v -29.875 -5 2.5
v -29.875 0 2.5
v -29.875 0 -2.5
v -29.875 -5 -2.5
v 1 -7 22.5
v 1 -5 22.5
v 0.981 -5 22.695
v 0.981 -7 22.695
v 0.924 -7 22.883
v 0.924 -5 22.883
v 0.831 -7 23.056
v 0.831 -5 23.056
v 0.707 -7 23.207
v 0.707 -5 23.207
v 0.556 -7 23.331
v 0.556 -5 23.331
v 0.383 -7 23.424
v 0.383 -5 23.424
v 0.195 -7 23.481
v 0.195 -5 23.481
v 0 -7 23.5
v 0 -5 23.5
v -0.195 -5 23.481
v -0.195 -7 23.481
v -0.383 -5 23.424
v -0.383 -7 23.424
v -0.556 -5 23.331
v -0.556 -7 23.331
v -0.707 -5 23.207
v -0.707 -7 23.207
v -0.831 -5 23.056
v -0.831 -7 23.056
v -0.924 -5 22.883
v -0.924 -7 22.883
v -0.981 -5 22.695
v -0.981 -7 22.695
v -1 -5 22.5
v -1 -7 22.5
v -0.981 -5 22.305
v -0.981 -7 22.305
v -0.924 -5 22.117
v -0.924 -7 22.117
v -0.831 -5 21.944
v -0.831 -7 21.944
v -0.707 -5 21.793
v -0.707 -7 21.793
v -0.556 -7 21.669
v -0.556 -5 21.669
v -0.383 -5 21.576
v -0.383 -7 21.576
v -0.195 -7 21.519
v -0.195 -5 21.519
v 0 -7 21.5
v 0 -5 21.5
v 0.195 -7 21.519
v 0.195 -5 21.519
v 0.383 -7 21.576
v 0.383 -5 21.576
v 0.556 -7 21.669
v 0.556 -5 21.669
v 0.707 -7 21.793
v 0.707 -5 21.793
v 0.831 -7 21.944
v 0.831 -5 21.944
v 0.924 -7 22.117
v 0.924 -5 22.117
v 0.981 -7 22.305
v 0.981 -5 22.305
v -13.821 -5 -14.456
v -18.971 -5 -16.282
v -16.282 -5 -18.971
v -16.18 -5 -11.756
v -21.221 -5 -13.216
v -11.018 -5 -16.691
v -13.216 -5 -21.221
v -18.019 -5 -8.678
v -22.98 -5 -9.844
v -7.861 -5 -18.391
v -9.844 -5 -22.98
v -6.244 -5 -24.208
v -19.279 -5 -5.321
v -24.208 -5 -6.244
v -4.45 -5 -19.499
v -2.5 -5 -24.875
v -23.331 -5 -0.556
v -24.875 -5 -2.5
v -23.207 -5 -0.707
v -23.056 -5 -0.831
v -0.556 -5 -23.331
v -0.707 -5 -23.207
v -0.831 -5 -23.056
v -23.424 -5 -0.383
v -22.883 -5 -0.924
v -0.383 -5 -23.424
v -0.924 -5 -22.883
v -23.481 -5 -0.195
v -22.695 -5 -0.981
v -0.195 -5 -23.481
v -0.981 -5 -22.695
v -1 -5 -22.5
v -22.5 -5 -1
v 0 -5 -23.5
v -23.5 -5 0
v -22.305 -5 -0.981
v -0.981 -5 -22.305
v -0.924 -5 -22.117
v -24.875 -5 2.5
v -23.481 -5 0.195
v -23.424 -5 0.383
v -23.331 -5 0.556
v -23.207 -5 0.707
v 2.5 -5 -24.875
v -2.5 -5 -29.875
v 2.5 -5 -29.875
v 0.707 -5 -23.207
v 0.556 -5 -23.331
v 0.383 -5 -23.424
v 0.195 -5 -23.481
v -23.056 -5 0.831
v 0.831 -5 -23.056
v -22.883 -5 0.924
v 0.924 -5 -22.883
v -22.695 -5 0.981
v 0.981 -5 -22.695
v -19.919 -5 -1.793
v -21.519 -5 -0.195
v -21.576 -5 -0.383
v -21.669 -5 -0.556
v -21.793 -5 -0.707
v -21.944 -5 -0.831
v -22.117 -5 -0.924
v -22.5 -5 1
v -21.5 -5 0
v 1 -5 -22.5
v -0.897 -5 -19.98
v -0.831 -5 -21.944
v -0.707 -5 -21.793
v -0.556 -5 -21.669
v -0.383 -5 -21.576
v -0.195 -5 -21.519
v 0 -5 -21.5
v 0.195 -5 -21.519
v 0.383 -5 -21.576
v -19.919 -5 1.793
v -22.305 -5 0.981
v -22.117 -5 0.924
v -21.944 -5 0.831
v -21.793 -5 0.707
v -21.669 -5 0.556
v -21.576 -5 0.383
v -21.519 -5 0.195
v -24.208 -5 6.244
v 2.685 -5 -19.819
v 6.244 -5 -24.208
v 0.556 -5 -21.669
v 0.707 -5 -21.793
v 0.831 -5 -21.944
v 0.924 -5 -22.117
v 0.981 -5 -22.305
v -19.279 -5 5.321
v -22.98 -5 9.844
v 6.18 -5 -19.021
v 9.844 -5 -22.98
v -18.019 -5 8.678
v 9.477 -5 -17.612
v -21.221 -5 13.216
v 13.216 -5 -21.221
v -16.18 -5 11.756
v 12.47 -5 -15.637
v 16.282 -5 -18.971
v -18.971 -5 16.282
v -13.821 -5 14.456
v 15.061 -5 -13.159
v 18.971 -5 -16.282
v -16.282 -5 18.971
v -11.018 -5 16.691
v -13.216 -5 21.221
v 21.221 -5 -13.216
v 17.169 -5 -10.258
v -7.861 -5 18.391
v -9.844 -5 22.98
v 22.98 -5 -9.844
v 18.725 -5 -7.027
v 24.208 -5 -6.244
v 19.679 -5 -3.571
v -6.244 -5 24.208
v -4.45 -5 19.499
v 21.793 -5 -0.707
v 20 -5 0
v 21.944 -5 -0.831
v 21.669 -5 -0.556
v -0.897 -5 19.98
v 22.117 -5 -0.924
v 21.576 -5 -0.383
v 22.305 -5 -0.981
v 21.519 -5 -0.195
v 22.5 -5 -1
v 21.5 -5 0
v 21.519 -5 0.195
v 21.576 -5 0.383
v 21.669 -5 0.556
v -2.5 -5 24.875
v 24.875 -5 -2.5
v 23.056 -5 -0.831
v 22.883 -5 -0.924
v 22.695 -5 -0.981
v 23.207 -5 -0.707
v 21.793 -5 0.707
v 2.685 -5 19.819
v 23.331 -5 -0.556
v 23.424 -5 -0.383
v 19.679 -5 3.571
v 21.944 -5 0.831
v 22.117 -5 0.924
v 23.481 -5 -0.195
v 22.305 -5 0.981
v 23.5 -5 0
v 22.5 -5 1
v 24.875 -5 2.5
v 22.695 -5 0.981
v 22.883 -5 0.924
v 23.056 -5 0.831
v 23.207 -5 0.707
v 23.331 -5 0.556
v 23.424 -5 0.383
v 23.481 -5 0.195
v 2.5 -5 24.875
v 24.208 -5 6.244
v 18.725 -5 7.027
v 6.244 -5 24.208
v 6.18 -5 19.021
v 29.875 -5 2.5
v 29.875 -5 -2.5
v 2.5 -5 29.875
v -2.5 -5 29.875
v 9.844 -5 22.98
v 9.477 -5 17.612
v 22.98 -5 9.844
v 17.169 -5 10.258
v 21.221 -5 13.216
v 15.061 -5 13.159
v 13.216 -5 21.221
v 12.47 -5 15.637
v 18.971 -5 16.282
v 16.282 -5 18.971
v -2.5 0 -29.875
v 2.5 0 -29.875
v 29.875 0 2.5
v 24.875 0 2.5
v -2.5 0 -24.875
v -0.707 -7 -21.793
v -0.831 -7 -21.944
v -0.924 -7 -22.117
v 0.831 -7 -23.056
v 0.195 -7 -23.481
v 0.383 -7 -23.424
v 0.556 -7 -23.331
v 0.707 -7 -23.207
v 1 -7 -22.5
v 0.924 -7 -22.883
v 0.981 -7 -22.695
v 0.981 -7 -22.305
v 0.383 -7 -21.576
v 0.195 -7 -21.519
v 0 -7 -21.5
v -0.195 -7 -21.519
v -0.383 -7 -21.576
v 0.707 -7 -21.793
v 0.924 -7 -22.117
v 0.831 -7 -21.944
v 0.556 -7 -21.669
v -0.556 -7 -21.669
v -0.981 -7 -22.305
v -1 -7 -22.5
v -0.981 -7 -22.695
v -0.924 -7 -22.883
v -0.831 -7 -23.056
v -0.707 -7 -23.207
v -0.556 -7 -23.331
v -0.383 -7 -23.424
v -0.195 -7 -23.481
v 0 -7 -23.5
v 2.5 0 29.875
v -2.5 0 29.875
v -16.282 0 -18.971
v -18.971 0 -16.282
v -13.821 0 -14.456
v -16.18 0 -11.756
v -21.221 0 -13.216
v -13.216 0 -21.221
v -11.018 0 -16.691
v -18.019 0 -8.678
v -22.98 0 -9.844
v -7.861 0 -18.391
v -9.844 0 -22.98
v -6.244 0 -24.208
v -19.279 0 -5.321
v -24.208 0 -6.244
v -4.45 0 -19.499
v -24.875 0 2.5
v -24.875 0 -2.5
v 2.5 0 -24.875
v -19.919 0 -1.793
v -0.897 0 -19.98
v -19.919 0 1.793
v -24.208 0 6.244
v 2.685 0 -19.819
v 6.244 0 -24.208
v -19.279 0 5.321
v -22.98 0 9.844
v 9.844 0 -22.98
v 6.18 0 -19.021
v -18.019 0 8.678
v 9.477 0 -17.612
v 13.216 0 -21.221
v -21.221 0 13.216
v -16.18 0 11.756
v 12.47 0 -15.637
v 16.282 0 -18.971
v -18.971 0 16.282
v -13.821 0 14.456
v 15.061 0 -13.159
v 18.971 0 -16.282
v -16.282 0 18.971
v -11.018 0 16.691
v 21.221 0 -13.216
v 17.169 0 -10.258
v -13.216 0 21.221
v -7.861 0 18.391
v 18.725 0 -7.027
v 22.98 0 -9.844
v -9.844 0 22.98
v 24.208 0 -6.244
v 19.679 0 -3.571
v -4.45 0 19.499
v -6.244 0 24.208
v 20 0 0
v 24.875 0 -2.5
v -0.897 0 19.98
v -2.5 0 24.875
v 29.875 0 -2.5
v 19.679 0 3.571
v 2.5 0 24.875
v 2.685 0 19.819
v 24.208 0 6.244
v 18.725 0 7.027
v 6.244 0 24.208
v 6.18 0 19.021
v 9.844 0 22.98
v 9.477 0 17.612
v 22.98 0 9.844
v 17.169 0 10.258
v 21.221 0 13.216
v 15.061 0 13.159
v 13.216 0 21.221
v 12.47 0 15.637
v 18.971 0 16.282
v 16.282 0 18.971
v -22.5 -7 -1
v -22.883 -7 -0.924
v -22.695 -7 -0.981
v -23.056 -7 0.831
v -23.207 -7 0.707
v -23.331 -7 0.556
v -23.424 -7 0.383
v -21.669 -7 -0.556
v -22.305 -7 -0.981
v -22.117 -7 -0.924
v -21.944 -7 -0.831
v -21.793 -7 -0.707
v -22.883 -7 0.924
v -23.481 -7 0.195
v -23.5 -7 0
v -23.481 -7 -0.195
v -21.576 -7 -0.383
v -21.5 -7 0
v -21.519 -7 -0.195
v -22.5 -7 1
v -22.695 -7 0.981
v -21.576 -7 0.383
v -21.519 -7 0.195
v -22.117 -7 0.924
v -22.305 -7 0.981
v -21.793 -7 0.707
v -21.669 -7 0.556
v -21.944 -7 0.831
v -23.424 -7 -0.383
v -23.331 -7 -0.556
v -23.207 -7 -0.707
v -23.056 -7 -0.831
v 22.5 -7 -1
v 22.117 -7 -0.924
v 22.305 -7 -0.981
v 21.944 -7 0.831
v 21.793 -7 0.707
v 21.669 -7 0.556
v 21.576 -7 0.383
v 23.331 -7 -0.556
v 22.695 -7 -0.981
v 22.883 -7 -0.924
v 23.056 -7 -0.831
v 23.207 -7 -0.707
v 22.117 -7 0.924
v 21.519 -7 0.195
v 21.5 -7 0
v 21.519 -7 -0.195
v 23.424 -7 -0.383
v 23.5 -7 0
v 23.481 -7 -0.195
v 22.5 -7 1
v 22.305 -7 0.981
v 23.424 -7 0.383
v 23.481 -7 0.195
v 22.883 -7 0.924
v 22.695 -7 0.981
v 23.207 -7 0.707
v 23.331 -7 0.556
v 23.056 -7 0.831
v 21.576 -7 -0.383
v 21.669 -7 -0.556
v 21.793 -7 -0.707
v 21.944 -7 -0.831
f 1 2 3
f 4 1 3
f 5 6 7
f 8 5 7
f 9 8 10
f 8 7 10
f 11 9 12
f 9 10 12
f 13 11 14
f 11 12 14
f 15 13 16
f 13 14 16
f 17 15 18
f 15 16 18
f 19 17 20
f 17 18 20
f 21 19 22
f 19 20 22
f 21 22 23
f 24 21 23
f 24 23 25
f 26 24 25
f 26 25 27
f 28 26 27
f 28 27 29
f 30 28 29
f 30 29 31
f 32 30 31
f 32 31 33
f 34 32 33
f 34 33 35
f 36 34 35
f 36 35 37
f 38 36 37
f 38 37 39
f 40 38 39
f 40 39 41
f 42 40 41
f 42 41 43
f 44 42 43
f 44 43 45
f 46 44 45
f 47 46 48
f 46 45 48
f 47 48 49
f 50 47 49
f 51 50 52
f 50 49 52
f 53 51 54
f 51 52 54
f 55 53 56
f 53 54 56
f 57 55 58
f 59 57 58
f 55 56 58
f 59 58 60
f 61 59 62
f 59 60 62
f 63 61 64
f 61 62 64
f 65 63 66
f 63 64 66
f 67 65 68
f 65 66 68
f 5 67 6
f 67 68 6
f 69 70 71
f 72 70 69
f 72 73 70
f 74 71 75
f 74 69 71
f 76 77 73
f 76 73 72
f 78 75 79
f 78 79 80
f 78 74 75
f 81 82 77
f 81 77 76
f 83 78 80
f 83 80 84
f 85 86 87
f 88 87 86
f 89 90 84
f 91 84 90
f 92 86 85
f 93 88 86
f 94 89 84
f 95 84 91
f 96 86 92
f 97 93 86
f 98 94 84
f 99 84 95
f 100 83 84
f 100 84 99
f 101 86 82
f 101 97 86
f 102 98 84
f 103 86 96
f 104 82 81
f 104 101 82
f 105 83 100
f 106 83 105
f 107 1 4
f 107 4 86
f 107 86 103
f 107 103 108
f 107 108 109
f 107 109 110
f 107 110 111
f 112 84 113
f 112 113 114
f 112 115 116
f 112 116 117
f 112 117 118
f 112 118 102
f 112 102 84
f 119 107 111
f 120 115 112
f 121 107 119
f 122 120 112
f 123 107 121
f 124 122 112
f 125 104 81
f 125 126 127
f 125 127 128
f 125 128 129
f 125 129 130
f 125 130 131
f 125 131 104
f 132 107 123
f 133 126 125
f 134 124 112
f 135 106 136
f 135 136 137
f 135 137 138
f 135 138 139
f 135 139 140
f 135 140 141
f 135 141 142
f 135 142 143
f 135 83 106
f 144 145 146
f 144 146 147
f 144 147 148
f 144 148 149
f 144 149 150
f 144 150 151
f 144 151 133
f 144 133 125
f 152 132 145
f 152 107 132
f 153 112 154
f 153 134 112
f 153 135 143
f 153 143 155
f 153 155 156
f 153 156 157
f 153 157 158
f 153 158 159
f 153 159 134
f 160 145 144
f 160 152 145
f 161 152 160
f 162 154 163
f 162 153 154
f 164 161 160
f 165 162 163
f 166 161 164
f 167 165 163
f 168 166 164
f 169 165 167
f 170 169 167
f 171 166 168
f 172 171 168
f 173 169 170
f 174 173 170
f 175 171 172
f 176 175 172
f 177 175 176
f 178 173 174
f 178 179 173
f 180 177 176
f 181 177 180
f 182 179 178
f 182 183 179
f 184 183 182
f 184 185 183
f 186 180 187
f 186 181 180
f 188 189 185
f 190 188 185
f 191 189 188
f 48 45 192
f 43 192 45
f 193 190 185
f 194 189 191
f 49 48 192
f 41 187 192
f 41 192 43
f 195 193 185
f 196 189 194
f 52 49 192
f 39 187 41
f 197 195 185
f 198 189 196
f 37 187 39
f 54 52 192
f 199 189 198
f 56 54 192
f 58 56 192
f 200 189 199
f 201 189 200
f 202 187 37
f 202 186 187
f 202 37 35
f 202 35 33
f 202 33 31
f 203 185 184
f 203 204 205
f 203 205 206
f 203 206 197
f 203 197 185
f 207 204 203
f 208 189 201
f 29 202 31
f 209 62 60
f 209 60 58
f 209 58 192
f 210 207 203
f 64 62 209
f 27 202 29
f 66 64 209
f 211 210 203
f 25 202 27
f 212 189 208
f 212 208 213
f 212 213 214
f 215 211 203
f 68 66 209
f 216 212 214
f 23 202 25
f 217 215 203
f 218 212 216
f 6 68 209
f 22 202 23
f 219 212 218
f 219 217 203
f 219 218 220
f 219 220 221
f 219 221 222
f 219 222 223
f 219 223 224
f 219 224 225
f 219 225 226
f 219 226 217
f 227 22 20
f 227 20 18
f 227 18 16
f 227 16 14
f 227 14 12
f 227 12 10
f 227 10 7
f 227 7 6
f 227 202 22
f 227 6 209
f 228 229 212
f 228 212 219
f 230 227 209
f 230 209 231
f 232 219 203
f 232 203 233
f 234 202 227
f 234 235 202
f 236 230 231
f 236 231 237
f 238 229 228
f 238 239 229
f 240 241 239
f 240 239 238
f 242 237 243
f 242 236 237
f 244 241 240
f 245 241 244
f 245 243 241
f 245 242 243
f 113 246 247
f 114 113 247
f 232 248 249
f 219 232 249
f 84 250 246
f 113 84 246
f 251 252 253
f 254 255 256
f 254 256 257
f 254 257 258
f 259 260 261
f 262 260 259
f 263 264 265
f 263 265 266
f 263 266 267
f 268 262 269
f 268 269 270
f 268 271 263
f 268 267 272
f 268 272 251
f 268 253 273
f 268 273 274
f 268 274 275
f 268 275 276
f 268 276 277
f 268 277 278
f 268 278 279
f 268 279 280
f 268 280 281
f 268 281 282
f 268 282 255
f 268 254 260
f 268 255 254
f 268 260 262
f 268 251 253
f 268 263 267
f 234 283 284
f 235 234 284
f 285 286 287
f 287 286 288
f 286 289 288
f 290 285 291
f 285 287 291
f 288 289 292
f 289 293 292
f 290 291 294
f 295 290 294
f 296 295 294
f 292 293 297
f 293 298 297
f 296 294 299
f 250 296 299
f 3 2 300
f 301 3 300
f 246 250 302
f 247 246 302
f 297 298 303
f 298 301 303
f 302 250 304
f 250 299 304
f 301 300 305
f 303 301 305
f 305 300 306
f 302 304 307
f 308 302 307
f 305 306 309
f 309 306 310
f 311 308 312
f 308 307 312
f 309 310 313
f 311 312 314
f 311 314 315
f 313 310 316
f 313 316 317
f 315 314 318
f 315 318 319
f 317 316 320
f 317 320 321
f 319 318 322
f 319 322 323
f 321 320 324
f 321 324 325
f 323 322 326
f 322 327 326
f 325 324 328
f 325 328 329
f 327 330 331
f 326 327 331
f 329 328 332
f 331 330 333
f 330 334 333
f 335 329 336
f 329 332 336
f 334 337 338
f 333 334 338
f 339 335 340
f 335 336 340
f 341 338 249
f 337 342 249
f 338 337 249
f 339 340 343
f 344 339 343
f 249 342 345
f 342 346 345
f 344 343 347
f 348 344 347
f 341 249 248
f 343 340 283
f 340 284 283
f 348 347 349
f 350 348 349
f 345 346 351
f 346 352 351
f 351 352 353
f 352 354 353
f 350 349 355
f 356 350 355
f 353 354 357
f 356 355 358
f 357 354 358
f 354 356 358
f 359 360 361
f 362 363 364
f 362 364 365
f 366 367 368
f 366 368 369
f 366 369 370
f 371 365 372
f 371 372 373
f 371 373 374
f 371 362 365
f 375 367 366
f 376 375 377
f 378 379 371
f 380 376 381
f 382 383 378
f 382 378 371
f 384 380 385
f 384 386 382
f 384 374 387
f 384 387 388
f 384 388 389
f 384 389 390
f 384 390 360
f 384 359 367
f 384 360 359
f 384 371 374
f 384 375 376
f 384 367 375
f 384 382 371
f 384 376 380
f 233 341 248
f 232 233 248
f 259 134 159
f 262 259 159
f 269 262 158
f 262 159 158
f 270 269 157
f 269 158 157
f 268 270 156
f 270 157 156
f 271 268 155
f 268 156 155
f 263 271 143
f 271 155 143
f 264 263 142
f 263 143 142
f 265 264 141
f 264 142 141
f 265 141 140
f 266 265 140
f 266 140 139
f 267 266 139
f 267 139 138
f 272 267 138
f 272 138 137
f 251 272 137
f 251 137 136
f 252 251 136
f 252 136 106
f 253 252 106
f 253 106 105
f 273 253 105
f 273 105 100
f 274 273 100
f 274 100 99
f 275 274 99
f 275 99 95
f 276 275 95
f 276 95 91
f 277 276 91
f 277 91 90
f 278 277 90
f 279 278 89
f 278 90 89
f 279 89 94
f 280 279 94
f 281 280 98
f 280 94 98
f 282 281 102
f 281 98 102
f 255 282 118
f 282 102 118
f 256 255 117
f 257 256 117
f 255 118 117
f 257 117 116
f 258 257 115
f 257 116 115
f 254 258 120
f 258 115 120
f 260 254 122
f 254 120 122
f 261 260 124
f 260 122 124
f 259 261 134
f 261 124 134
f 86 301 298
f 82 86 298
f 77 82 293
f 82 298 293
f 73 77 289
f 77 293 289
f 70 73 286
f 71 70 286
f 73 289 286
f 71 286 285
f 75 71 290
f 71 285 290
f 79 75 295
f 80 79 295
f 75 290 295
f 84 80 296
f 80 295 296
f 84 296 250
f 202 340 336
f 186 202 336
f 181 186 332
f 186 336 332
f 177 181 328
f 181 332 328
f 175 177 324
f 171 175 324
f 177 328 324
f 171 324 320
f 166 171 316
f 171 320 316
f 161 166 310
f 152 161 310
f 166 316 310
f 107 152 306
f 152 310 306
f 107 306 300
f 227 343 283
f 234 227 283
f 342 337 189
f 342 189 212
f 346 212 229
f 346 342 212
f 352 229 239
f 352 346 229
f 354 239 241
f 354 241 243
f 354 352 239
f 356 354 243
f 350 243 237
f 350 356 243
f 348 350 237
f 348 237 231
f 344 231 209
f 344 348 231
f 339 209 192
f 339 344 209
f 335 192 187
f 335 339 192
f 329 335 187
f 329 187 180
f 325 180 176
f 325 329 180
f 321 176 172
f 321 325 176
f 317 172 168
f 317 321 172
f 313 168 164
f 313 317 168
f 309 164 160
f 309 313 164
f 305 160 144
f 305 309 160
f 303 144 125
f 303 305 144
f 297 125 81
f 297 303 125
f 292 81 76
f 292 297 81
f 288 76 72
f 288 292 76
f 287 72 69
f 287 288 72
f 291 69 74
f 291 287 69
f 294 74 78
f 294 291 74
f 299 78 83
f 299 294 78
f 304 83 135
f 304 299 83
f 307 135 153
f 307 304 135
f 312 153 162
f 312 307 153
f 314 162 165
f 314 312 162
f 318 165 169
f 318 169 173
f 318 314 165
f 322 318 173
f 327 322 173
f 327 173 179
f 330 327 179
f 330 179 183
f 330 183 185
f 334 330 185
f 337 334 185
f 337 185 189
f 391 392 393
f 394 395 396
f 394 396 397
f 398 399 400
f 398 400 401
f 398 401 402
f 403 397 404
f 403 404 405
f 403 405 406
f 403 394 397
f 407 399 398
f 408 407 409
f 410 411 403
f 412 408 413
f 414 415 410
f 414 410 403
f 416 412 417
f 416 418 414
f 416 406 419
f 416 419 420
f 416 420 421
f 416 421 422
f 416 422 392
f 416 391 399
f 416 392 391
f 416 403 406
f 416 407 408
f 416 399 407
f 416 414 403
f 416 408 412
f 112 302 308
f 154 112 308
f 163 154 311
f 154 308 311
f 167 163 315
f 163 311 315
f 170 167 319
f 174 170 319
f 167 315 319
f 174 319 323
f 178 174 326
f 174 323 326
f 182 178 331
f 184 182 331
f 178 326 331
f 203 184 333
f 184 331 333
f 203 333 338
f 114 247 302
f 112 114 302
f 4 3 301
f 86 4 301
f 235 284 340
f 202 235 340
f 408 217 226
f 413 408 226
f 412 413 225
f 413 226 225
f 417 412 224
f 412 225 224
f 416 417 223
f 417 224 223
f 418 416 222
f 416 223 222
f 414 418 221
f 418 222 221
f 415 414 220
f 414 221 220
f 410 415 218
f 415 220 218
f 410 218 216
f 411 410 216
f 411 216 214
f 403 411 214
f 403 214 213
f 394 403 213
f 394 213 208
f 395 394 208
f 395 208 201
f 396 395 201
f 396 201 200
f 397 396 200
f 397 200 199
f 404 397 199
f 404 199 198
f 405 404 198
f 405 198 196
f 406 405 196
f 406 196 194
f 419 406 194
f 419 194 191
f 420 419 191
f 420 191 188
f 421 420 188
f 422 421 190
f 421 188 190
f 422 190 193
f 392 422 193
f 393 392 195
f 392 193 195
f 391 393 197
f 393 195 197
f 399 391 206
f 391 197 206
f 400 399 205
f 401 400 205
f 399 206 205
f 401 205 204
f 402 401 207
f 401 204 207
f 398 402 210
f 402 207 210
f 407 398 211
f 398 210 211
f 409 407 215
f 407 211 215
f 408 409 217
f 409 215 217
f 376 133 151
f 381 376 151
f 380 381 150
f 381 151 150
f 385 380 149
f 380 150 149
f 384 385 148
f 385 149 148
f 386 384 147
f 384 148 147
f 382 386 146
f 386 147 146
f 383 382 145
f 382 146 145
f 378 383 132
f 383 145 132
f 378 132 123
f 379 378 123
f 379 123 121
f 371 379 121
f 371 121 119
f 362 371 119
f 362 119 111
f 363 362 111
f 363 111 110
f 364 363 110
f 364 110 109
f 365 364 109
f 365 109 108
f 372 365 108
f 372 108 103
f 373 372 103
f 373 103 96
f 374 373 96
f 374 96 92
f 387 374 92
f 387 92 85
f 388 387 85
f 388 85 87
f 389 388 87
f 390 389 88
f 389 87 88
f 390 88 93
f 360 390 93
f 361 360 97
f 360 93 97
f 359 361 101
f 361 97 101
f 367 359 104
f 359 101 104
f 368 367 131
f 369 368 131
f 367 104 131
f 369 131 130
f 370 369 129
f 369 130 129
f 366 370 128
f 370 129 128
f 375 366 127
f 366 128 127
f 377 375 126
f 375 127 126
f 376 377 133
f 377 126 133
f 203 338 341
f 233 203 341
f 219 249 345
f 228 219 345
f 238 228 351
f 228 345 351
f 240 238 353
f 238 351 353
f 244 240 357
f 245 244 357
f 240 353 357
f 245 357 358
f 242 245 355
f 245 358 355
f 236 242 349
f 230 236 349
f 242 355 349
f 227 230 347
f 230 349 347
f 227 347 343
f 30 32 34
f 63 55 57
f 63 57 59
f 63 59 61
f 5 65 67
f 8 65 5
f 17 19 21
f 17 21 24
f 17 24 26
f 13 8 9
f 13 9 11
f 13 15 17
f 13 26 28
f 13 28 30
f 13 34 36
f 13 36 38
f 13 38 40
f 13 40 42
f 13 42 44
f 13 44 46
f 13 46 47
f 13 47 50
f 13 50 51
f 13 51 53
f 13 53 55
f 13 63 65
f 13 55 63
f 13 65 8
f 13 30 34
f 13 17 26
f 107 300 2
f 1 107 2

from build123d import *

# Parameters (mm, degrees)
F0_R     = 20
F1_DEPTH = 5
F2_R     = 1
F3_DEPTH = 7


with BuildPart() as f1:
    # F0 (on Front) → F1 (new body)
    with BuildSketch(Plane.XZ):
        with BuildLine():
            ThreePointArc((24.8746859277, -2.5), (24.9686518278, -1.2515693765), (25, 0))
            ThreePointArc((25, 0), (24.9686518278, 1.2515693765), (24.8746859277, 2.5))
            Line((24.8746859277, 2.5), (24.8746859277, -2.5))
        make_face()
        with BuildLine():
            ThreePointArc((24.8746859277, 2.5), (24.9686518278, 1.2515693765), (25, 0))
            ThreePointArc((25, 0), (24.9686518278, -1.2515693765), (24.8746859277, -2.5))
            Line((24.8746859277, -2.5), (29.8746859277, -2.5))
            Line((29.8746859277, -2.5), (29.8746859277, 2.5))
            Line((29.8746859277, 2.5), (24.8746859277, 2.5))
        make_face()
        with BuildLine():
            Line((24.8746859277, -2.5), (24.8746859277, 2.5))
            ThreePointArc((24.8746859277, 2.5), (17.6776695297, 17.6776695297), (2.5, 24.8746859277))
            Line((2.5, 24.8746859277), (-2.5, 24.8746859277))
            ThreePointArc((-2.5, 24.8746859277), (-17.6776695297, 17.6776695297), (-24.8746859277, 2.5))
            ThreePointArc((-24.8746859277, 2.5), (-25, 0), (-24.8746859277, -2.5))
            ThreePointArc((-24.8746859277, -2.5), (-17.6776695297, -17.6776695297), (-2.5, -24.8746859277))
            ThreePointArc((-2.5, -24.8746859277), (0, -25), (2.5, -24.8746859277))
            ThreePointArc((2.5, -24.8746859277), (17.6776695297, -17.6776695297), (24.8746859277, -2.5))
        make_face()
        Circle(F0_R, mode=Mode.SUBTRACT)
        with BuildLine():
            Line((-2.5, 24.8746859277), (2.5, 24.8746859277))
            ThreePointArc((2.5, 24.8746859277), (0, 25), (-2.5, 24.8746859277))
        make_face()
        with BuildLine():
            ThreePointArc((-2.5, 24.8746859277), (0, 25), (2.5, 24.8746859277))
            Line((2.5, 24.8746859277), (2.5, 29.8746859277))
            Line((2.5, 29.8746859277), (-2.5, 29.8746859277))
            Line((-2.5, 29.8746859277), (-2.5, 24.8746859277))
        make_face()
        with BuildLine():
            Line((2.5, -29.8746859277), (2.5, -24.8746859277))
            ThreePointArc((2.5, -24.8746859277), (0, -25), (-2.5, -24.8746859277))
            Line((-2.5, -24.8746859277), (-2.5, -29.8746859277))
            Line((-2.5, -29.8746859277), (2.5, -29.8746859277))
        make_face()
        with BuildLine():
            ThreePointArc((-24.8746859277, -2.5), (-25, 0), (-24.8746859277, 2.5))
            Line((-24.8746859277, 2.5), (-29.8746859277, 2.5))
            Line((-29.8746859277, 2.5), (-29.8746859277, -2.5))
            Line((-29.8746859277, -2.5), (-24.8746859277, -2.5))
        make_face()
    extrude(amount=F1_DEPTH)

    # F2 (on Front) → F3 (join)
    with BuildSketch(Plane.XZ):
        with Locations((0, 22.5)):
            Circle(F2_R)
        with Locations((0, -22.5)):
            Circle(F2_R)
        with Locations((22.5, 0)):
            Circle(F2_R)
        with Locations((-22.5, 0)):
            Circle(F2_R)
    extrude(amount=F3_DEPTH)


solid = f1.part
